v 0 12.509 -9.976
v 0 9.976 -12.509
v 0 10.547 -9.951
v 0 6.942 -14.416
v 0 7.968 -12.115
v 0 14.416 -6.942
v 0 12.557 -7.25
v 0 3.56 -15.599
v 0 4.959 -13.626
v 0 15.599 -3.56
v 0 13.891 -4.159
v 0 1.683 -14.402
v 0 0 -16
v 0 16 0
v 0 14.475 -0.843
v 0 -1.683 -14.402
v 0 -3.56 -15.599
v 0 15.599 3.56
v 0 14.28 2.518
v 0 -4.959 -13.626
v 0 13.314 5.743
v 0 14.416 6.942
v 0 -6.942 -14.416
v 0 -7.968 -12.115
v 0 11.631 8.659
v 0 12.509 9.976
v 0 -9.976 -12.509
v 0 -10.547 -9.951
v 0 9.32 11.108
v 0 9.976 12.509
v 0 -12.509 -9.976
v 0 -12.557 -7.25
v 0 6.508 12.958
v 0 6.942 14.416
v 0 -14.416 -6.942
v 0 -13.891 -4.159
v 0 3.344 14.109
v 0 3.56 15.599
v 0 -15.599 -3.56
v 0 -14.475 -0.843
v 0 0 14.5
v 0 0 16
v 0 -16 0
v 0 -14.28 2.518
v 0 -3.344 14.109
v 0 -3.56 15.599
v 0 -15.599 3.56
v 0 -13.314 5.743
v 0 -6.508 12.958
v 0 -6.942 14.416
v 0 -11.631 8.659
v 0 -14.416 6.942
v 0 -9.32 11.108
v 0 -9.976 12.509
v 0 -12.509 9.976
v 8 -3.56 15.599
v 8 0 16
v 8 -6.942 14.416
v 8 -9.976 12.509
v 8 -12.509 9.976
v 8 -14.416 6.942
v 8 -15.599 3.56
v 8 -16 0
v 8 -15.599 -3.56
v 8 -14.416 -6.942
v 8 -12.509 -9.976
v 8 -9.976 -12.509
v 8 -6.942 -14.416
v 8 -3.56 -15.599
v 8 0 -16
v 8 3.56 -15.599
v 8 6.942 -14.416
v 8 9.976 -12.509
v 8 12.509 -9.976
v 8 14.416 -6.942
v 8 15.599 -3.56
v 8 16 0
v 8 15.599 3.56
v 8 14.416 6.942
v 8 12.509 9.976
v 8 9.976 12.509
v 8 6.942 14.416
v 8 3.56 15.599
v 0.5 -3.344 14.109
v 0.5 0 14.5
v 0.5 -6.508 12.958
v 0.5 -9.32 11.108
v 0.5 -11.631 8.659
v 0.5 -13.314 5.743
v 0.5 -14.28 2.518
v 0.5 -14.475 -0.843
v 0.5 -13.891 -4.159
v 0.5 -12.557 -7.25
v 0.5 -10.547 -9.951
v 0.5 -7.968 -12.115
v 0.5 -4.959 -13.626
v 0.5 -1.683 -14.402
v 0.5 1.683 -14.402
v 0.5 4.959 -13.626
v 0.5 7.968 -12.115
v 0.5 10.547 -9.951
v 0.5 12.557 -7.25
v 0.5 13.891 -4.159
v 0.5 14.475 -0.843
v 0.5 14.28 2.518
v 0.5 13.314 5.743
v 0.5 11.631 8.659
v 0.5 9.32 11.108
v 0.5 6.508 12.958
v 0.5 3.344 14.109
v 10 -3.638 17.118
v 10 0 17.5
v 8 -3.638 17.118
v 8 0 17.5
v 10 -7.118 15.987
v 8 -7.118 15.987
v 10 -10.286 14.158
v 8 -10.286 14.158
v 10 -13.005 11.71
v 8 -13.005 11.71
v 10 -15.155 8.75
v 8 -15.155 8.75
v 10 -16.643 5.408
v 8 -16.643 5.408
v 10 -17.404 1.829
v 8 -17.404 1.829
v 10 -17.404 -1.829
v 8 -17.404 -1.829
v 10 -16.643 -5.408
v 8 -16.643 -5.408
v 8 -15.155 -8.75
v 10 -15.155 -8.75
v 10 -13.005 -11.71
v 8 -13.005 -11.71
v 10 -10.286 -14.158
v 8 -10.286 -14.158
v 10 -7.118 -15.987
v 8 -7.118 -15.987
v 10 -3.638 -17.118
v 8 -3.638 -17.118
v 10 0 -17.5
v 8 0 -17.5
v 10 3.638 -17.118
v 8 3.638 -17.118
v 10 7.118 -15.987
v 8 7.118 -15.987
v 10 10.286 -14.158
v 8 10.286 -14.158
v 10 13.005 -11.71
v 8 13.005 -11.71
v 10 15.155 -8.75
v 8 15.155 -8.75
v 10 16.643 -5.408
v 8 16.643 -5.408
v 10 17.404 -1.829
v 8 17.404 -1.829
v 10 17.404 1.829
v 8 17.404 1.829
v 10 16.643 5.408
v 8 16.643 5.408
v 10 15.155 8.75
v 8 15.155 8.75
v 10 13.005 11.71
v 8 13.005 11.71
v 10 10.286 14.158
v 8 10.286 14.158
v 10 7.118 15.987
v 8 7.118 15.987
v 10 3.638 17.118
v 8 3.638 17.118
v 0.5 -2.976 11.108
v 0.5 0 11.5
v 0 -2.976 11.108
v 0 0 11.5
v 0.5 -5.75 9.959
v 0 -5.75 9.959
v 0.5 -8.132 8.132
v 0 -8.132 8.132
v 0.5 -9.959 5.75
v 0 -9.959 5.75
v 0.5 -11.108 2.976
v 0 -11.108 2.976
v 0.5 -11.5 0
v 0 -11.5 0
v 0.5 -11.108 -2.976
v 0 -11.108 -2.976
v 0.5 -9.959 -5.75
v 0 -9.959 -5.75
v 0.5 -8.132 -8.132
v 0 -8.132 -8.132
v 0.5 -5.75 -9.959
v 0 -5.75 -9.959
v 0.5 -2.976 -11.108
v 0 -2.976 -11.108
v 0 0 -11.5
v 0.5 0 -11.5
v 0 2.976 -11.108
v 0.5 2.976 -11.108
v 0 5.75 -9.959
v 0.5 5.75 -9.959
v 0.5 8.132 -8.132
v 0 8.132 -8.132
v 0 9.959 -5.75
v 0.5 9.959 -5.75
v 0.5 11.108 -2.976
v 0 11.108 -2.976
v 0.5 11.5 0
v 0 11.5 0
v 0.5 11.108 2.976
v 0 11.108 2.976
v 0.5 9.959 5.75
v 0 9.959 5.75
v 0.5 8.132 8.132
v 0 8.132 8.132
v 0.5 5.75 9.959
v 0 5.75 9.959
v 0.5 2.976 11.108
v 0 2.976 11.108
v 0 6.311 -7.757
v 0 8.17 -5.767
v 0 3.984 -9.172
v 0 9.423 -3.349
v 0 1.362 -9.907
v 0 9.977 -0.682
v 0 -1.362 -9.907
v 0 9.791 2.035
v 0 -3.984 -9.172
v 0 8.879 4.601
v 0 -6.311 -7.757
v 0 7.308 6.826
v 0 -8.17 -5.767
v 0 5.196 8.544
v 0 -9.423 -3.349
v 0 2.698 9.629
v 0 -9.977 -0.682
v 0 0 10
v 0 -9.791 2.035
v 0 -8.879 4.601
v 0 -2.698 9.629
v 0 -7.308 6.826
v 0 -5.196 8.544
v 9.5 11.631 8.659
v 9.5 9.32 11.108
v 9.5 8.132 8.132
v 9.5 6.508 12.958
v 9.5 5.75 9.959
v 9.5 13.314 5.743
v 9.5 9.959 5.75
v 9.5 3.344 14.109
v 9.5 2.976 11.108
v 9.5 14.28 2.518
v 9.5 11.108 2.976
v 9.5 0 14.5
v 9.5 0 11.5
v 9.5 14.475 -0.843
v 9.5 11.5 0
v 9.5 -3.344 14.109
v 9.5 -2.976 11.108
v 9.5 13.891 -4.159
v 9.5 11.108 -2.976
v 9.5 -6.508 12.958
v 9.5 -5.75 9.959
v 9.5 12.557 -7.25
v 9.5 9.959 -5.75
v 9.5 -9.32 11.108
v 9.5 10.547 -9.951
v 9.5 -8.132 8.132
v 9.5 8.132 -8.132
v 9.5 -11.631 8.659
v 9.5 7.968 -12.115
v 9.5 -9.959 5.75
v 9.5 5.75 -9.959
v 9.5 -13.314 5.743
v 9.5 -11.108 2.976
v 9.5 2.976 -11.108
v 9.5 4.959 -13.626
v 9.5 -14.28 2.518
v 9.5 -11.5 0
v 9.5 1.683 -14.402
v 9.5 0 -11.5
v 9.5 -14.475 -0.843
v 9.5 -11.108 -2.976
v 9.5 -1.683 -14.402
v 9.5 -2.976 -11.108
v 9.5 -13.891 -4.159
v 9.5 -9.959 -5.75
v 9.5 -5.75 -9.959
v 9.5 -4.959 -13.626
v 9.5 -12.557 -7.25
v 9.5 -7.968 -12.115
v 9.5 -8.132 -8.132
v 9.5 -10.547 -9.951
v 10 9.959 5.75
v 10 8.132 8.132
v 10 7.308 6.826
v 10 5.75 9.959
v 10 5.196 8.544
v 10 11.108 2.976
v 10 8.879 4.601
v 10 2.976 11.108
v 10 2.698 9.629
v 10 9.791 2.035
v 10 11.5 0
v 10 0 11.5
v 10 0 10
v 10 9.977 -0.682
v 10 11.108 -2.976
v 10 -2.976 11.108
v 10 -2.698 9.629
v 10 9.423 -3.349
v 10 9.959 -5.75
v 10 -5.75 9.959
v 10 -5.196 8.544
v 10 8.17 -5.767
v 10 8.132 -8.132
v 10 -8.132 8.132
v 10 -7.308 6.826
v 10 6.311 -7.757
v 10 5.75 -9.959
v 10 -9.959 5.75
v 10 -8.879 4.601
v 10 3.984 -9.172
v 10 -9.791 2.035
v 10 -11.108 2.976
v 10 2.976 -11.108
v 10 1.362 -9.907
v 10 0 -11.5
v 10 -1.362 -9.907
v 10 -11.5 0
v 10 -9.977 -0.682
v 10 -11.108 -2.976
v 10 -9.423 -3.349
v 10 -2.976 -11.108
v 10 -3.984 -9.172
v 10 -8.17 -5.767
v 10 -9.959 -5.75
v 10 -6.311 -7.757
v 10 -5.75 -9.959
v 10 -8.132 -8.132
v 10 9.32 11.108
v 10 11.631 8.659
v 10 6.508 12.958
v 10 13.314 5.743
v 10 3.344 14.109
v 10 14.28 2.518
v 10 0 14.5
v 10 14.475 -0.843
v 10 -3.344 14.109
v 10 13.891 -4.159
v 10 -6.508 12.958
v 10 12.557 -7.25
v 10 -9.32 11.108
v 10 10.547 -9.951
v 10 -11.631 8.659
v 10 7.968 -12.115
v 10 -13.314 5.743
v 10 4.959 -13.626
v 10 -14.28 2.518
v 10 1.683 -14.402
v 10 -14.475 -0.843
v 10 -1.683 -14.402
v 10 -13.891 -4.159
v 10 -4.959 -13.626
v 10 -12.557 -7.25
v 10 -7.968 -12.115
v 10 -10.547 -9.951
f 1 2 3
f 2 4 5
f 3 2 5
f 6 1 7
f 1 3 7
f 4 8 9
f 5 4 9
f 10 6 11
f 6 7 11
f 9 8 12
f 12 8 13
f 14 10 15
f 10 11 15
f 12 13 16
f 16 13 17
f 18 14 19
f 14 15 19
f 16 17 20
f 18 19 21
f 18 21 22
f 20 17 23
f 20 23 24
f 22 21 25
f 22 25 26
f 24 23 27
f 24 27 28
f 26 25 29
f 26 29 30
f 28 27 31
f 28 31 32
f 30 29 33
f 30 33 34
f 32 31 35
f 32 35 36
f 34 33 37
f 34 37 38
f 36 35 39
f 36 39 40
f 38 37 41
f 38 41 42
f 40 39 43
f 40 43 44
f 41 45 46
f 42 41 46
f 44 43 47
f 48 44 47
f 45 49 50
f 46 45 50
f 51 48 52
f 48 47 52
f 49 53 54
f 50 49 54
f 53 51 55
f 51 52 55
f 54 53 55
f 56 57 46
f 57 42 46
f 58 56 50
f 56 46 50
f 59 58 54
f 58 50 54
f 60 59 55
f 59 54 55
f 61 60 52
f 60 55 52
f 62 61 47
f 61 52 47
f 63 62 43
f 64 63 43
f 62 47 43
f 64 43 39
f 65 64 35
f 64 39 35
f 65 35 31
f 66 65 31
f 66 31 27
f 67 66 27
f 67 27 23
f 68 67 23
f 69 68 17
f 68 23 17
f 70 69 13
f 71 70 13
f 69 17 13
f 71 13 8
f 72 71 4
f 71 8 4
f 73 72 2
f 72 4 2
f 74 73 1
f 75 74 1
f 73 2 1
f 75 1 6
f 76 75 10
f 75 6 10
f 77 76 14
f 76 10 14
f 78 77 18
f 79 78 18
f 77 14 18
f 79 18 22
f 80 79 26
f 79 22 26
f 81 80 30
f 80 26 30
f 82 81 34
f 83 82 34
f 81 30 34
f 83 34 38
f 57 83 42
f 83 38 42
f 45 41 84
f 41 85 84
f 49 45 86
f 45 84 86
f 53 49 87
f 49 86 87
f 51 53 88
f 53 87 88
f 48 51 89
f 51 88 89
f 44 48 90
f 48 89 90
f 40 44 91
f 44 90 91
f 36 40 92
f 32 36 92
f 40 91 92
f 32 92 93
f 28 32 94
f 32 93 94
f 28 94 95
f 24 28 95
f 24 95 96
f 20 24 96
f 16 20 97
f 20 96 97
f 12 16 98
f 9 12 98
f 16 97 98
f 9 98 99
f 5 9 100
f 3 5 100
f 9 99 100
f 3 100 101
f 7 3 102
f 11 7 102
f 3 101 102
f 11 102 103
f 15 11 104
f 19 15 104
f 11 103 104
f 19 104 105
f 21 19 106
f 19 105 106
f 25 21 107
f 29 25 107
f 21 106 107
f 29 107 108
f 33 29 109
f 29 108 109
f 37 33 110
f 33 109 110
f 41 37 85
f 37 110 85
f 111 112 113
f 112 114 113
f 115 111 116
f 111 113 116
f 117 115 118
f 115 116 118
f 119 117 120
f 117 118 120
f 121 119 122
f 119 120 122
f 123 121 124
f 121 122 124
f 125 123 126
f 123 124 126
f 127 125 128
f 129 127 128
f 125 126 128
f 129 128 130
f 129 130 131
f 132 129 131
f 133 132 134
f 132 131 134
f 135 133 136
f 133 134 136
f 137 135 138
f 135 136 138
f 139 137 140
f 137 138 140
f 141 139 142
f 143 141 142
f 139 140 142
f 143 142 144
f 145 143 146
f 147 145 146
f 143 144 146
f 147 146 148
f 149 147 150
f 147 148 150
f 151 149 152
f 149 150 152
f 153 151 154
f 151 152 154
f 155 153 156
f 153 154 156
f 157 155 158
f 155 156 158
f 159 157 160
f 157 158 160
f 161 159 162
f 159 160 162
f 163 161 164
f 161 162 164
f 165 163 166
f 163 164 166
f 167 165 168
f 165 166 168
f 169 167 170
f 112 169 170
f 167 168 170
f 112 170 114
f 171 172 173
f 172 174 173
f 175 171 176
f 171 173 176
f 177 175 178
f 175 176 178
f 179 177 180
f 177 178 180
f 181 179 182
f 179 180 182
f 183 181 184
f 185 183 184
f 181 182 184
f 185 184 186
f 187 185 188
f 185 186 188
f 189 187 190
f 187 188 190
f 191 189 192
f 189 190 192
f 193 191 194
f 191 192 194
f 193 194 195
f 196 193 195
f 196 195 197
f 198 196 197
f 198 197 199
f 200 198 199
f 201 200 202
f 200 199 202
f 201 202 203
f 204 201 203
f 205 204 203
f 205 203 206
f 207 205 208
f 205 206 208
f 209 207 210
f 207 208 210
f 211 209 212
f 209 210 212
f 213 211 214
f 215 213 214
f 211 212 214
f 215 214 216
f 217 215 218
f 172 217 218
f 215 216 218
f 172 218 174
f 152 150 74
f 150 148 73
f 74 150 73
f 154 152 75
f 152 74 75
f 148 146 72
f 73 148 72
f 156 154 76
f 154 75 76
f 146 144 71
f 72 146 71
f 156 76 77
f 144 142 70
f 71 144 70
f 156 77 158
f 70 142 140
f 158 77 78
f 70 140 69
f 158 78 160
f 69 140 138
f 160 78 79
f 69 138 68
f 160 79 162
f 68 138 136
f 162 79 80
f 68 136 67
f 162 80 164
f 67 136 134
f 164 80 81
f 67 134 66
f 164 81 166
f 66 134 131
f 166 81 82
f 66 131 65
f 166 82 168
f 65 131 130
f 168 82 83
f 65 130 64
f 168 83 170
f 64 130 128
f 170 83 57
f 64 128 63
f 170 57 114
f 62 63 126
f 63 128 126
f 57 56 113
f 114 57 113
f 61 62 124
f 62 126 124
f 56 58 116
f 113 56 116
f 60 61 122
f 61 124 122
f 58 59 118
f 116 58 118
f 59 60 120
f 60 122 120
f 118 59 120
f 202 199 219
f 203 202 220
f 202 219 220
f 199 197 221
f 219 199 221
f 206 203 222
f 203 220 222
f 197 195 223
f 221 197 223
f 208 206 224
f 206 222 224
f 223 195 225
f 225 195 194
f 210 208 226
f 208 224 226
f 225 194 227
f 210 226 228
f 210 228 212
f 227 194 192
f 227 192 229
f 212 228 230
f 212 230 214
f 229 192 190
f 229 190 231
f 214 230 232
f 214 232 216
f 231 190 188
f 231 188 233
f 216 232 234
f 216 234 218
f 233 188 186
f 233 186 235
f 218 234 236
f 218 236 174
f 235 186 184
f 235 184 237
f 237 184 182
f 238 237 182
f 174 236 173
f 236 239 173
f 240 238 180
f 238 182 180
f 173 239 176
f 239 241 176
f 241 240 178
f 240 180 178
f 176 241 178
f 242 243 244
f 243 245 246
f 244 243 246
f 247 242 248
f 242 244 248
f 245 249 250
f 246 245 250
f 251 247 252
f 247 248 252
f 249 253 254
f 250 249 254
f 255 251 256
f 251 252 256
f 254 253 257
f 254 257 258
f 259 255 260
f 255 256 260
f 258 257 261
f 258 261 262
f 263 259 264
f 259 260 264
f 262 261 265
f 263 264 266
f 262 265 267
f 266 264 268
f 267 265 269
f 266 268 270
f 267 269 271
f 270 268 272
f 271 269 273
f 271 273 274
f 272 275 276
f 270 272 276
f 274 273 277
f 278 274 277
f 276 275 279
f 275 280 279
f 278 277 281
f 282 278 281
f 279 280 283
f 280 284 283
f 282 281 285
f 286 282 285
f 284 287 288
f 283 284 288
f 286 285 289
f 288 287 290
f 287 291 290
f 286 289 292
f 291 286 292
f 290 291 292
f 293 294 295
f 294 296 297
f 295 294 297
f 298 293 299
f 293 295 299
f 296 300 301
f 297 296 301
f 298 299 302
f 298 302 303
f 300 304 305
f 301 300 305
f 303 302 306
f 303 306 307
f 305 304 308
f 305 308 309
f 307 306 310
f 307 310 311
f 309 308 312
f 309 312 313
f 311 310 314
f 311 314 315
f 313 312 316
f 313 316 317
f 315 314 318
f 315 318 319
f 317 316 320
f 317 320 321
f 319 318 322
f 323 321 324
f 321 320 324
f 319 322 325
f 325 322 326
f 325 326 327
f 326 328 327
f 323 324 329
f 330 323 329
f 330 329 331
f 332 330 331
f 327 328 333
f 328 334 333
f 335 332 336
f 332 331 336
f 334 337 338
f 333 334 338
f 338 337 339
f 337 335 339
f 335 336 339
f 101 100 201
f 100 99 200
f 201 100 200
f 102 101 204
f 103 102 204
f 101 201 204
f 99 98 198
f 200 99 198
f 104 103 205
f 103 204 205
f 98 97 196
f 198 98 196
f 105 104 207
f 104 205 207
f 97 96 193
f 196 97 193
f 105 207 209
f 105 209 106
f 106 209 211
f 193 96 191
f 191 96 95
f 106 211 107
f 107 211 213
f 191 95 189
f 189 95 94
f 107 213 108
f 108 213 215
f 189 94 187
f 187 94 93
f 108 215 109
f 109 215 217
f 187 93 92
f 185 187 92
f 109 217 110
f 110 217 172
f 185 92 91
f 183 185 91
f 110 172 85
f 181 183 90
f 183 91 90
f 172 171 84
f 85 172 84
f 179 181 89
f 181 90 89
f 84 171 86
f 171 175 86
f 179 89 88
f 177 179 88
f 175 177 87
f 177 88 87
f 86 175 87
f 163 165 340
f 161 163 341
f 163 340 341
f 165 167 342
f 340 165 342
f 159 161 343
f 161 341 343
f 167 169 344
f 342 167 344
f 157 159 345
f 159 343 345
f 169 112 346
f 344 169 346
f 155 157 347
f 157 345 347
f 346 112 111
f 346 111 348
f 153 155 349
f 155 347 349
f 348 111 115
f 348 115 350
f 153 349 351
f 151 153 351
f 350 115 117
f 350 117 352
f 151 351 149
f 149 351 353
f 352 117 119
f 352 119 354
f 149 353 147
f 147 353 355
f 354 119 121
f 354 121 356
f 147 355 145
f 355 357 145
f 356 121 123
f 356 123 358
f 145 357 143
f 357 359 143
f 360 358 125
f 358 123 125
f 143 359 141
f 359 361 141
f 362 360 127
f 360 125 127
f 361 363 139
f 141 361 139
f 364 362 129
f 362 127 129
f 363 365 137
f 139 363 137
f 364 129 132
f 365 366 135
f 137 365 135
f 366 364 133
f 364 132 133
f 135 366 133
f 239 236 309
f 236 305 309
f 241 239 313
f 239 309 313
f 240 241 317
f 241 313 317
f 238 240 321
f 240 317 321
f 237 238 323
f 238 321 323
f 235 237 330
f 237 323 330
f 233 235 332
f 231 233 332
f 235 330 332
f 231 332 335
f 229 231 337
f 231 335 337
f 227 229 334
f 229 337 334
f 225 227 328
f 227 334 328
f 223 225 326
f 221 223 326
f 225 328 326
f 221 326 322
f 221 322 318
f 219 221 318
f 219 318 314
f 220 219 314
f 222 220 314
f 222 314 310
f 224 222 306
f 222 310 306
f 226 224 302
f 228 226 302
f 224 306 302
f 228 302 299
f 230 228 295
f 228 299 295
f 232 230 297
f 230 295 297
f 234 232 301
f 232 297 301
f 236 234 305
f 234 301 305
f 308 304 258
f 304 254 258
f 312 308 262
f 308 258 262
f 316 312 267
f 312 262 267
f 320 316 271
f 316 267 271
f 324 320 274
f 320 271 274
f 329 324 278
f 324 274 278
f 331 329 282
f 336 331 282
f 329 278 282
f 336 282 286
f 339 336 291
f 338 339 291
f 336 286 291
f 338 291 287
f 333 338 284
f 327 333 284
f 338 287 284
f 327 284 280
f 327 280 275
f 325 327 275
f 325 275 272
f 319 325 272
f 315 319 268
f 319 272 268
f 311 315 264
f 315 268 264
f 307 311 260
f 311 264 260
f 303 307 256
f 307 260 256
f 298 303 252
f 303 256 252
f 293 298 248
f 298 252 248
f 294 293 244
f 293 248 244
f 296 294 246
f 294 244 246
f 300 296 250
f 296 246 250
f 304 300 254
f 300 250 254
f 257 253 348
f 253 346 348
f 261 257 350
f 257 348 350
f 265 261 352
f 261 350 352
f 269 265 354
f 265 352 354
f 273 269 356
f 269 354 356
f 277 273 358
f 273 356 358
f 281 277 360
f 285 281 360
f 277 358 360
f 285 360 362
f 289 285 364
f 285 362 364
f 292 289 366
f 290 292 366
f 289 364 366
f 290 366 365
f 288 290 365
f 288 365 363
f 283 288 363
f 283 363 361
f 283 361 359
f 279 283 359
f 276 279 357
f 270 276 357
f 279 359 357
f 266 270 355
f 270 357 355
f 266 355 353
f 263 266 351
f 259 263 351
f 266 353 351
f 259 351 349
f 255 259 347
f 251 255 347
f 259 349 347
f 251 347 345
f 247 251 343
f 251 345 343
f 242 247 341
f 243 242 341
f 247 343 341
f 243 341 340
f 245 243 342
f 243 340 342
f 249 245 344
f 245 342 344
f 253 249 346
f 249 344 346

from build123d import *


with BuildPart() as part:
    # 草图1 → 旋转1 (revolve)
    with BuildSketch(Plane(origin=(0, 0, 0), x_dir=(1, 0, 0), z_dir=(0, 1, 0)), mode=Mode.PRIVATE) as revolve_1_sk:
        Polygon((0, 10), (10, 10), (10, 11.5), (9.5, 11.5), (9.5, 14.5), (10, 14.5), (10, 17.5), (8, 17.5), (8, 16), (0, 16), (0, 14.5), (0.5, 14.5), (0.5, 11.5), (0, 11.5), align=None)
    revolve(revolve_1_sk.sketch.rotate(Axis((0, 0, 0), (1, 0, 0)), 180), axis=Axis((0, 0, 0), (1, 0, 0)))


solid = part.part
